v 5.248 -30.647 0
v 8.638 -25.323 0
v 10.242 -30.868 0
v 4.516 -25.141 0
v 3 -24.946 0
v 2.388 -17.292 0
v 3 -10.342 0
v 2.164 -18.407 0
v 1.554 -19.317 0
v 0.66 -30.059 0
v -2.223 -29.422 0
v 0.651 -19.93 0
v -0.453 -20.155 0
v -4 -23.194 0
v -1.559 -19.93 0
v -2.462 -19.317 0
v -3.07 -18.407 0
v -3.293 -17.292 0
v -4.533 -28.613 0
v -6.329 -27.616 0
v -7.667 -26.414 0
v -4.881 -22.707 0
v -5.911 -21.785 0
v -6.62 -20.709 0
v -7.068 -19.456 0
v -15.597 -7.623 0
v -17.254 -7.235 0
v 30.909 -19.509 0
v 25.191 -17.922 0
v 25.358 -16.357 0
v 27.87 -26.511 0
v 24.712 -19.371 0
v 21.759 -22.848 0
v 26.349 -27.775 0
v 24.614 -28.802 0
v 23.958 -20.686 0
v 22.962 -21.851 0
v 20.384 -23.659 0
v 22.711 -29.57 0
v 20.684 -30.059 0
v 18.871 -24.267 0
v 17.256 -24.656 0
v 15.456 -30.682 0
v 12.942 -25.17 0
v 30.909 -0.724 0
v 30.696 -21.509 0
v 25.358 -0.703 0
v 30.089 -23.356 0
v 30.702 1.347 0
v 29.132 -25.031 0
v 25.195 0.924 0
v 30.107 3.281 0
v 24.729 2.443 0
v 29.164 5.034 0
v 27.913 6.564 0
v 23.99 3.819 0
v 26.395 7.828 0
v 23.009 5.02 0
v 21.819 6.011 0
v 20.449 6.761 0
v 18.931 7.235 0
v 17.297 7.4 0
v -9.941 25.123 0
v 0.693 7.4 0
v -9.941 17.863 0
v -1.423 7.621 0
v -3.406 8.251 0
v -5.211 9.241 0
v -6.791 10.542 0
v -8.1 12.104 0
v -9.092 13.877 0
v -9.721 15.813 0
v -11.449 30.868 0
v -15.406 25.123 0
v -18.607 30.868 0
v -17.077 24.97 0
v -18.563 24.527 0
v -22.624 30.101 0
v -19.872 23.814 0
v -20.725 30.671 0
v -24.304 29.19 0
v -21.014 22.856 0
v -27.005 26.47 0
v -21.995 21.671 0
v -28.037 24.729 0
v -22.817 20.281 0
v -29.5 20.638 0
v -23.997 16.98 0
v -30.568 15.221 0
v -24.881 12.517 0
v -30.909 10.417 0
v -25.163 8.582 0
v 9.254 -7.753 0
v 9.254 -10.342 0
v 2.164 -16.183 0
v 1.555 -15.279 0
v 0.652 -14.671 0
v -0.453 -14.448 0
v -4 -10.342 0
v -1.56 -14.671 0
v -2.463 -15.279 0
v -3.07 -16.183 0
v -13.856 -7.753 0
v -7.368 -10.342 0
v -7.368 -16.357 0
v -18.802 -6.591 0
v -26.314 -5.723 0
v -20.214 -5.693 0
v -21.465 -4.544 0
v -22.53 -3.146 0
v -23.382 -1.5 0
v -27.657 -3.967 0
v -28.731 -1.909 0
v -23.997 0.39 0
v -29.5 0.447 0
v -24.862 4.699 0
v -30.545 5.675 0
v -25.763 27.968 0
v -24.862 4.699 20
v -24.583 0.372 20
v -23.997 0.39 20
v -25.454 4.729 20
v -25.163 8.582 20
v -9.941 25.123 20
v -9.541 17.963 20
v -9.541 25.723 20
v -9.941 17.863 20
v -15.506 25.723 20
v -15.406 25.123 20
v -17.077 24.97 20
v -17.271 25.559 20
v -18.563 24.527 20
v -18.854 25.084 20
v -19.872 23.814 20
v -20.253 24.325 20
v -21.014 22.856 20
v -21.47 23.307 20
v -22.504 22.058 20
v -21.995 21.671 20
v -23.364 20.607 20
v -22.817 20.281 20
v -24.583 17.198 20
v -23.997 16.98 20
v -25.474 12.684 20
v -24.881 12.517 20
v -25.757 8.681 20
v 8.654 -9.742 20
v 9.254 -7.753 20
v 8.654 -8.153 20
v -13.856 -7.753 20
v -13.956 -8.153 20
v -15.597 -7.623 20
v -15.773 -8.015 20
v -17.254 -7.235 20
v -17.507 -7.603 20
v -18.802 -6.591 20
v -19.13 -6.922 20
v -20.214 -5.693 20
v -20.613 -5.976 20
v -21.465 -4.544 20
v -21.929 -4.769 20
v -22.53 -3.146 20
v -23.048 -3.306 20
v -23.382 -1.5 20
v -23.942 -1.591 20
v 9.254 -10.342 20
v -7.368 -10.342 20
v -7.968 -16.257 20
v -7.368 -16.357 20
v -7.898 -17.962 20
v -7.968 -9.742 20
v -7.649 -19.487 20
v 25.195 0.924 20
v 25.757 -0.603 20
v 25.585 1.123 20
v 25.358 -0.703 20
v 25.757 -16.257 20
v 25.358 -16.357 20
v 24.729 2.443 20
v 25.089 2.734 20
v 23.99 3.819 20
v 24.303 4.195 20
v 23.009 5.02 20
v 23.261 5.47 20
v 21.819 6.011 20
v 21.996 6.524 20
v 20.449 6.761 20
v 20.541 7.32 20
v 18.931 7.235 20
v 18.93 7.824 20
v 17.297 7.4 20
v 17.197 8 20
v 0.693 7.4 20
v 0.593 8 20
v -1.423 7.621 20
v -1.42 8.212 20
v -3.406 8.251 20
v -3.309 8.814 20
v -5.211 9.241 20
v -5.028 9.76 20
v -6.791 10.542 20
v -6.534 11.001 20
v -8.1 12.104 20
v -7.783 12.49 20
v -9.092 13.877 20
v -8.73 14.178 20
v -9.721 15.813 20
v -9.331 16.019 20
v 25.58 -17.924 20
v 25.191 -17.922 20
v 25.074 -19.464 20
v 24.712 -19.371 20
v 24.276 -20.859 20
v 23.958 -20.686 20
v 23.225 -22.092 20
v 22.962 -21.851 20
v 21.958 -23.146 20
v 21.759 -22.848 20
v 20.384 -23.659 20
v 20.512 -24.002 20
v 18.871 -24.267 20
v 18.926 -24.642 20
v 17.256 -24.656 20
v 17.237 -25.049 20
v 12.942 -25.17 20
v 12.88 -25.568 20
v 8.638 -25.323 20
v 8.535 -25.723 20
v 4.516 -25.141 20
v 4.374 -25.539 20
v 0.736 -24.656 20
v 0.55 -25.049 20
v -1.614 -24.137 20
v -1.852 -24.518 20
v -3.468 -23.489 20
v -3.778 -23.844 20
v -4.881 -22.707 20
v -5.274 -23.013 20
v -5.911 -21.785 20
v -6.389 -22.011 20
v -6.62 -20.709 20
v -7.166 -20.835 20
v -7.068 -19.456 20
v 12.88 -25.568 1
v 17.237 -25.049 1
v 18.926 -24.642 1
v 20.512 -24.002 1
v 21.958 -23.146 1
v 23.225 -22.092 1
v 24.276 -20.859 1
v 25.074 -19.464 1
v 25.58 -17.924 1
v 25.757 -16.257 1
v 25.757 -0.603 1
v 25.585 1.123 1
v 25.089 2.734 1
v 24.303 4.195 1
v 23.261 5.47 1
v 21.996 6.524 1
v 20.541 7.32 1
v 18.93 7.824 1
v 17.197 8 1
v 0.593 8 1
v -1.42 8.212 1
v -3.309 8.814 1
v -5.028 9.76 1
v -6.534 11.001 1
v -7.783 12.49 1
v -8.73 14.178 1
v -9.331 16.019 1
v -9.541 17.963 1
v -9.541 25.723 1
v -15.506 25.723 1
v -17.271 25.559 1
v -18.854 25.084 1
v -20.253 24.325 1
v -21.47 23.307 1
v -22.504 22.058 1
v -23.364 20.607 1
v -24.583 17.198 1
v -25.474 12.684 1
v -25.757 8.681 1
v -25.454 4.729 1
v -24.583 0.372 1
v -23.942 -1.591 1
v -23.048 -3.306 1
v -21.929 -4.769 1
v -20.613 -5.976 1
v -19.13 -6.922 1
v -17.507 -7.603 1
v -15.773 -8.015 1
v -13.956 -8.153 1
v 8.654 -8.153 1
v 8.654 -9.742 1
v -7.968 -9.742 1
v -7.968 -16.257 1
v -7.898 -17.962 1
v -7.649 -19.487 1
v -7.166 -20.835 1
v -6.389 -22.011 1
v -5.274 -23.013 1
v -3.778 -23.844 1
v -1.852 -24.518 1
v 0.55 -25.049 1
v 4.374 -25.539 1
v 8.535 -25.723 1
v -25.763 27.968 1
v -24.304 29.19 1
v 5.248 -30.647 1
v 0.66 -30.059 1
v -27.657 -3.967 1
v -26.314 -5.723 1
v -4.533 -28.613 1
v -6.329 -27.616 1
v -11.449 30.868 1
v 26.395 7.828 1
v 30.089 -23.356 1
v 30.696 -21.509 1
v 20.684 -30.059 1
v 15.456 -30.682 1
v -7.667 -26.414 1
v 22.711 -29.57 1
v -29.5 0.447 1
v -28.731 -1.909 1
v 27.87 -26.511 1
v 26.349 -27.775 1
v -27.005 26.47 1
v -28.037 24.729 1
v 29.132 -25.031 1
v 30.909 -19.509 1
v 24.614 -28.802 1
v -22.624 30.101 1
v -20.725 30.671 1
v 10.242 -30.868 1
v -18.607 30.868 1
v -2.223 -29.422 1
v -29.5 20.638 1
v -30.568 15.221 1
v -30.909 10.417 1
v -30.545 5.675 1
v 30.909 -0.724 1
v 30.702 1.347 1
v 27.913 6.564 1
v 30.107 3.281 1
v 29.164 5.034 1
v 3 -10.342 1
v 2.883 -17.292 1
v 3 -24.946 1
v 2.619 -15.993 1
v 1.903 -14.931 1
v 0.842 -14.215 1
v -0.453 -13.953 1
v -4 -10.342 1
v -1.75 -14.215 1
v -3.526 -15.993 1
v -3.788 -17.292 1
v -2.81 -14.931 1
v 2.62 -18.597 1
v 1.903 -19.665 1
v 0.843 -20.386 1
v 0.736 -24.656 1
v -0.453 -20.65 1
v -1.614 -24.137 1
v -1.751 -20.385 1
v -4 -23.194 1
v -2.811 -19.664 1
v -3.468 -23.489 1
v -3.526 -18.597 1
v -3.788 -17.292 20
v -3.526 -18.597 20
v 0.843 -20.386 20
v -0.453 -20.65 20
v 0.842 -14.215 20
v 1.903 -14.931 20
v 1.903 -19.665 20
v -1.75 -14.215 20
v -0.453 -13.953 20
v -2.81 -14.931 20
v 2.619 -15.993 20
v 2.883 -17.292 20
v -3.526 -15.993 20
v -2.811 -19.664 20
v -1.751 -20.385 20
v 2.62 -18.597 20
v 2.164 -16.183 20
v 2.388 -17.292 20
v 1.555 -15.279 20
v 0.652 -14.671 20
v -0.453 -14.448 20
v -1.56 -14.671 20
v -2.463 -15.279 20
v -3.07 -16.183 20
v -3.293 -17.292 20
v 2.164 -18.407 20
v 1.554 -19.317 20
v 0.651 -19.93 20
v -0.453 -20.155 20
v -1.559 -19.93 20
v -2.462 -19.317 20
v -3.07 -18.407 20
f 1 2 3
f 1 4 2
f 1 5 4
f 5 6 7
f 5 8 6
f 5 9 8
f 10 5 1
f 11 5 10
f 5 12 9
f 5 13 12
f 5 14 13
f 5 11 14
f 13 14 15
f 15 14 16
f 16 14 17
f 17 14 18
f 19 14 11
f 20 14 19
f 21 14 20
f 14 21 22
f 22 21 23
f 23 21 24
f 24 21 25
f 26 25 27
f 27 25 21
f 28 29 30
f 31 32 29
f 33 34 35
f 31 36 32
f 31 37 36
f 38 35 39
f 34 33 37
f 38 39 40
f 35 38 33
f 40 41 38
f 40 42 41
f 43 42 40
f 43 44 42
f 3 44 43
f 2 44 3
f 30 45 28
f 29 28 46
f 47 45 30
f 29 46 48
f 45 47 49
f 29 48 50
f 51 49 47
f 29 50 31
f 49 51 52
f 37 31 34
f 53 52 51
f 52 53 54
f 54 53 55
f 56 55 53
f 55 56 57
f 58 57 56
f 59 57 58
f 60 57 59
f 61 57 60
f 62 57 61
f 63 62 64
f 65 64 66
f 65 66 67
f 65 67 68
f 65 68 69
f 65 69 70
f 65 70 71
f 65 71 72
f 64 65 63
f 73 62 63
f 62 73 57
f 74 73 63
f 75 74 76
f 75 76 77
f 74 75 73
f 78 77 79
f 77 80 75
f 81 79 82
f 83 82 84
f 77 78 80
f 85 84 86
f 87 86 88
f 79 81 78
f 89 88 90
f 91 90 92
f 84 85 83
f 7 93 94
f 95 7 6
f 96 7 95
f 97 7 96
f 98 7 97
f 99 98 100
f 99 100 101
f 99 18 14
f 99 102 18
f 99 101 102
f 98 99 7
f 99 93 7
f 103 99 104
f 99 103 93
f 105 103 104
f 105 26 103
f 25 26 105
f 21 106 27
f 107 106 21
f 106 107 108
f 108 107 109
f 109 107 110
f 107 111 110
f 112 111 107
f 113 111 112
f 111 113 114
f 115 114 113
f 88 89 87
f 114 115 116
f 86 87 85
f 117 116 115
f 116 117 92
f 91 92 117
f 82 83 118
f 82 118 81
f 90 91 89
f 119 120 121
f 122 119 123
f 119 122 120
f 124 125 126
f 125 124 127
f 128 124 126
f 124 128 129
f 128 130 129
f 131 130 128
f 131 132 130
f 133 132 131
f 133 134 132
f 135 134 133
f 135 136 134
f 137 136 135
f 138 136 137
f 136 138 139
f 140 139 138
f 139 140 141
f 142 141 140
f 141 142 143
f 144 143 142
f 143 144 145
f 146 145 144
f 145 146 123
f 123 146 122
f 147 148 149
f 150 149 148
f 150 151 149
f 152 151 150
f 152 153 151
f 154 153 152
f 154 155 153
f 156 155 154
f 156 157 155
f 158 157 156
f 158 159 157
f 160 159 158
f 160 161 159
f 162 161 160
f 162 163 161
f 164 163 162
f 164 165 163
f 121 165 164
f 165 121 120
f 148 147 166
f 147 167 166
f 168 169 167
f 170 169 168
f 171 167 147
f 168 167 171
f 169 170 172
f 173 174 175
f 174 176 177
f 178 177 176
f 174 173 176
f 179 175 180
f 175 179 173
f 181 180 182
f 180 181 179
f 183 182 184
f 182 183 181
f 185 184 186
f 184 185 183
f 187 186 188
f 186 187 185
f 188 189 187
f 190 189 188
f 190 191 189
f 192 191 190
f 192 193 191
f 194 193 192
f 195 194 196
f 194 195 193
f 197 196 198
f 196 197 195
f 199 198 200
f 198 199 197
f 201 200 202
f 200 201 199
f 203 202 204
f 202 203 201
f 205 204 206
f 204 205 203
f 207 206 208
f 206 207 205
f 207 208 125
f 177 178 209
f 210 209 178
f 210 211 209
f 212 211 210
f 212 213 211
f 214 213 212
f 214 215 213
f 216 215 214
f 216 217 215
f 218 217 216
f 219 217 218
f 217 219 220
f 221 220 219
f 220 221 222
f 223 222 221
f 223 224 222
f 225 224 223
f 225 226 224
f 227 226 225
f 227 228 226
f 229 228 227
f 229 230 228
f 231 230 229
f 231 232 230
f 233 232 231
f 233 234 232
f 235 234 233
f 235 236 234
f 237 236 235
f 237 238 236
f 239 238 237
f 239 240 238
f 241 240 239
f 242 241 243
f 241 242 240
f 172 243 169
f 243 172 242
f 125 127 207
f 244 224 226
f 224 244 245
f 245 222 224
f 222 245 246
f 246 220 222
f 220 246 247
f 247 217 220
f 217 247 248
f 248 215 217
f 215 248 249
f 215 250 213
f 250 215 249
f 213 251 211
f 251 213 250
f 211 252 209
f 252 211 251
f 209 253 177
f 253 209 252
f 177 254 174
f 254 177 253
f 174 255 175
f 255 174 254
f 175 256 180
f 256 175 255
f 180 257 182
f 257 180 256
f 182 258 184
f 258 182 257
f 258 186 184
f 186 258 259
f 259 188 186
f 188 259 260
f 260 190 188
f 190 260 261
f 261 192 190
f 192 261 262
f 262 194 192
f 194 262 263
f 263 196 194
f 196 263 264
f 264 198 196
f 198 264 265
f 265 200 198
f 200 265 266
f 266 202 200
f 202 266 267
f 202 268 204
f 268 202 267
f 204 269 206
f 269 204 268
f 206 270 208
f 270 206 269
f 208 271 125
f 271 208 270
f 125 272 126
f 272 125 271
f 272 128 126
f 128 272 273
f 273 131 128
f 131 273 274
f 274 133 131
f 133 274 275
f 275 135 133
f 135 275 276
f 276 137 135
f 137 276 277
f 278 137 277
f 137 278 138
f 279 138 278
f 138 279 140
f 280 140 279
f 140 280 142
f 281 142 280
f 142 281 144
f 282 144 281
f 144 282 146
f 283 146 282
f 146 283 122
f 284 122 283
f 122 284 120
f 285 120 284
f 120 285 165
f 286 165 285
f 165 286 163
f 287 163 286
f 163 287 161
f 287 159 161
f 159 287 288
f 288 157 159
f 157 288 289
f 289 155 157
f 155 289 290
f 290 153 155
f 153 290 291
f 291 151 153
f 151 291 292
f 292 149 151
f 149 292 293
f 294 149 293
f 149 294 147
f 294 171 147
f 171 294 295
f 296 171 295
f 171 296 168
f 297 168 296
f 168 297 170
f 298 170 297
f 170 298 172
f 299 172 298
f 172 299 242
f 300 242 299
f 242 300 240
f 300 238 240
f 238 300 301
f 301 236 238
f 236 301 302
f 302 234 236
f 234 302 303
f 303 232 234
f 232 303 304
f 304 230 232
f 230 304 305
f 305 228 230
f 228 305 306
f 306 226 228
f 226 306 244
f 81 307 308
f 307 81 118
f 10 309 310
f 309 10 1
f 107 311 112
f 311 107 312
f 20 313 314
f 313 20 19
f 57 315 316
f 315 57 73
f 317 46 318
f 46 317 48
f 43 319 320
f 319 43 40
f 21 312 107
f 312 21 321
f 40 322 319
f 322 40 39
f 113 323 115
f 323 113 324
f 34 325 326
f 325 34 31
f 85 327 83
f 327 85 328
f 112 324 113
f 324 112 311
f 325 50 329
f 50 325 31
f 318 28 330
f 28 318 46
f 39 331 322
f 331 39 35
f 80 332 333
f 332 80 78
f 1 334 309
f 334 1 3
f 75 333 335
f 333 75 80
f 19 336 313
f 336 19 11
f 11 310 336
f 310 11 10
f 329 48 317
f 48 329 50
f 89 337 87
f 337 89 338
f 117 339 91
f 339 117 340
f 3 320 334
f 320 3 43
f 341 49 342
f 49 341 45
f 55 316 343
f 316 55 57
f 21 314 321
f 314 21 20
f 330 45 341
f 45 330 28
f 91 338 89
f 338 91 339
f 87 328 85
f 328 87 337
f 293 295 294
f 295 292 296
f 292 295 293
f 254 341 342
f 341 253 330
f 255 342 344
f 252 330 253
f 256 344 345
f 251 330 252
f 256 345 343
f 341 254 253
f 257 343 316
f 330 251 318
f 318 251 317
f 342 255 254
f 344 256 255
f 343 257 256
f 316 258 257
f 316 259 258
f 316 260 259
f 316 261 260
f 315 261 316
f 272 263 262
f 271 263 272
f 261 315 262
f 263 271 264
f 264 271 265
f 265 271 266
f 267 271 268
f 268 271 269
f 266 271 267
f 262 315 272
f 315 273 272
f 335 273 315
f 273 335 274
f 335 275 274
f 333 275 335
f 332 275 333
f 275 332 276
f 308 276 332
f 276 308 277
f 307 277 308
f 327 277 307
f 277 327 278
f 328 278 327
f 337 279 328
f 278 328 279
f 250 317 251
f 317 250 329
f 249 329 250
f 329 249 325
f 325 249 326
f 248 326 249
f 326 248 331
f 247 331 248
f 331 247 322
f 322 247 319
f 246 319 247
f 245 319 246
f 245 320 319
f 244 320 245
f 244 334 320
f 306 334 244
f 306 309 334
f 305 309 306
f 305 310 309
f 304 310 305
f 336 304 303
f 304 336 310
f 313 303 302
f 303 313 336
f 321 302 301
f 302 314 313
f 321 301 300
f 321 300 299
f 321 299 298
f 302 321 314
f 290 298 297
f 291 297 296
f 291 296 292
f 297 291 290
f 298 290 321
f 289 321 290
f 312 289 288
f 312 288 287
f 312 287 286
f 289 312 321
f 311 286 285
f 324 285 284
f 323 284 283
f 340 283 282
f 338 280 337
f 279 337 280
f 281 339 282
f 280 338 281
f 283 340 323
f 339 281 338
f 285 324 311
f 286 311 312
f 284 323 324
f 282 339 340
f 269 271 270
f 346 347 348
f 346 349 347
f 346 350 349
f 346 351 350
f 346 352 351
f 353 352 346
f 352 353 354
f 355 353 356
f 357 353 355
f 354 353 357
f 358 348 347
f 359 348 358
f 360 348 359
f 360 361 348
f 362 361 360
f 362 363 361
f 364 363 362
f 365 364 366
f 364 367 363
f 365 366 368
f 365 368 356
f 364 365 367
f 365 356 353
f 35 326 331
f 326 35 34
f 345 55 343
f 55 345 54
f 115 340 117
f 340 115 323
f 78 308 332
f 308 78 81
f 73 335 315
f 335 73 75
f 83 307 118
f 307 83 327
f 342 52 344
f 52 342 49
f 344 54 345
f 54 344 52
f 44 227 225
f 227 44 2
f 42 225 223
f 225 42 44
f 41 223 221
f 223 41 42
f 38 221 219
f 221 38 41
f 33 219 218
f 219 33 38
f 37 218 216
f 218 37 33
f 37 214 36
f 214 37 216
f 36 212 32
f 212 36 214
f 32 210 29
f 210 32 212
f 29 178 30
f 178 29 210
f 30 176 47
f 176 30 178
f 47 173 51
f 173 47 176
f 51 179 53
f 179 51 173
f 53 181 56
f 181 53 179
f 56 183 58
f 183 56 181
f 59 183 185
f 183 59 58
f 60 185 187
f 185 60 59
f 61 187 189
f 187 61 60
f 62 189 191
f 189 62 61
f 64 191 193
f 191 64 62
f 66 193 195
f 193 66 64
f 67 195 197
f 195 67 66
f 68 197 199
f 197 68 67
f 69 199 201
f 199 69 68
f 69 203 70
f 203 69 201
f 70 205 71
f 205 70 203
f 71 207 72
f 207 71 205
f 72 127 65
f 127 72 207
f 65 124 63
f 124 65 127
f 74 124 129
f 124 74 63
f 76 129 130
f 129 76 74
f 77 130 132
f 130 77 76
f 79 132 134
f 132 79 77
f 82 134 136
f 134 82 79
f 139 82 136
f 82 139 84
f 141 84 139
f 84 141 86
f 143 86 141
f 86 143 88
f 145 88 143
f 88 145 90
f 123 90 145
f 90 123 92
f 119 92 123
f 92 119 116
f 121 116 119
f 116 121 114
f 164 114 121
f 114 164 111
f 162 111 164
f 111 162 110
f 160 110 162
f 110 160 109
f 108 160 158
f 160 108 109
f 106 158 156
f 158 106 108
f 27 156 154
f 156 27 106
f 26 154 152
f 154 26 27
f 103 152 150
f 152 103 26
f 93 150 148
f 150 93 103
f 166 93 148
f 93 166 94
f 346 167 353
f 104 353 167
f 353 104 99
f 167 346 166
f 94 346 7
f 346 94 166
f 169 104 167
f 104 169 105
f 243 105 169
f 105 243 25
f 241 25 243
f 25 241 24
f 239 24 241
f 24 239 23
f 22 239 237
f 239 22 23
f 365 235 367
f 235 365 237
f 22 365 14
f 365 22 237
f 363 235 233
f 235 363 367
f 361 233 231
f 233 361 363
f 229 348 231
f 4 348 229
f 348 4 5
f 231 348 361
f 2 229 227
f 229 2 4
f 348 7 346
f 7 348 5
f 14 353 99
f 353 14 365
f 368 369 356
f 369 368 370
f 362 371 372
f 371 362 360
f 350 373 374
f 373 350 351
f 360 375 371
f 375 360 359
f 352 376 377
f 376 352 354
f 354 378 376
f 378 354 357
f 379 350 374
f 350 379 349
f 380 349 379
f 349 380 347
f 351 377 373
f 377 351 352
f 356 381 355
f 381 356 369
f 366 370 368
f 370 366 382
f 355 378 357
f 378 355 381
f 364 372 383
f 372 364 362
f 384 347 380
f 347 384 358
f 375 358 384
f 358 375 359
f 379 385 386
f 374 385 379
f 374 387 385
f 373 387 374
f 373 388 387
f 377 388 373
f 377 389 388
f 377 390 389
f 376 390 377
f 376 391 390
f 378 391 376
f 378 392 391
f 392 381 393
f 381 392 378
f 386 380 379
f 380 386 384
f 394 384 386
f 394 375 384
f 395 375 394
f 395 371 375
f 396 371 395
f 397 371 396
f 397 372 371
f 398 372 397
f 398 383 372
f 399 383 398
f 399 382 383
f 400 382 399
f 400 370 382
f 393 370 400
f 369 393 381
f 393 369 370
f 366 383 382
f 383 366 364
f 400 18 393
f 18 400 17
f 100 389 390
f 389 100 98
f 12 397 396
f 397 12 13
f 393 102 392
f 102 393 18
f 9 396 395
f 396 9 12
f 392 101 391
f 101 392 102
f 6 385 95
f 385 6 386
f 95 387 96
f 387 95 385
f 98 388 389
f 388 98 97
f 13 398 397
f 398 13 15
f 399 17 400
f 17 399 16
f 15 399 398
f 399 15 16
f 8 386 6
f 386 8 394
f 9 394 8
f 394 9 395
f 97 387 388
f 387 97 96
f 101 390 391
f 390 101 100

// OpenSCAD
// file: p-half.scad
// Module names are of the form poly_<inkscape-path-id>().  As a result,
// you can associate a polygon in this OpenSCAD program with the corresponding
// SVG element in the Inkscape document by looking for the XML element with
// the attribute id="inkscape-path-id".

// fudge value is used to ensure that subtracted solids are a tad taller
// in the z dimension than the polygon being subtracted from.  This helps
// keep the resulting .stl file manifold.
fudge = 0.1;

module poly_half_outer(h)
{
  scale([25.4/90, -25.4/90, 1]) union()
  {
    linear_extrude(height=h)
      polygon([[30.243227,-91.145510],[15.496832,-90.492611],[1.950257,-88.756838],[-6.563700,-86.874606],[-13.385609,-84.485967],[-18.687045,-81.541846],[-22.639583,-77.993166],[-25.389702,-73.825158],[-27.104098,-69.046741],[-27.984675,-63.644368],[-28.233333,-57.604494],[-28.233333,-34.518557],[30.665107,-34.518557],[30.665107,-28.889651],[-27.346613,-28.889651],[-49.450133,-28.889651],[-55.887778,-28.399932],[-62.032228,-26.940893],[-67.782850,-24.527707],[-73.039011,-21.175548],[-77.700077,-16.899591],[-81.665417,-11.715009],[-84.834396,-5.636978],[-87.106383,1.319330],[-90.192546,16.757280],[-91.266667,30.758299],[-90.260645,44.944618],[-87.106383,60.938470],[-82.786996,73.017894],[-79.740282,78.159507],[-76.073173,82.583010],[-71.763379,86.190519],[-66.804333,88.881696],[-61.196994,90.564155],[-54.942323,91.145510],[-33.805603,91.145510],[-33.805603,63.647460],[-33.061354,56.758914],[-30.933282,50.238581],[-27.578403,44.256061],[-23.153731,38.980955],[-17.816279,34.582863],[-11.723062,31.231387],[-5.031096,29.096125],[2.102607,28.346680],[60.932677,28.346680],[67.075888,27.723394],[72.783903,25.937517],[77.938396,23.115022],[82.421043,19.381881],[86.113519,14.864066],[88.897498,9.687550],[90.654656,3.978303],[91.266667,-2.137700],[91.266667,-57.604494],[90.638988,-63.509642],[88.845058,-68.965869],[86.018539,-73.910334],[82.293092,-78.280197],[77.802379,-82.012619],[72.680061,-85.044760],[67.059800,-87.313779],[61.075257,-88.756838],[45.638118,-90.596608],[30.243227,-91.145510]]);
  }
}

module poly_half_inner(h)
{
  scale([25.4/90, -25.4/90, 1]) union()
  {
    linear_extrude(height=h)
      polygon([[30.251227,-89.374026],[45.504111,-88.829951],[60.788337,-87.008791],[66.512660,-85.631900],[71.872564,-83.475744],[76.745122,-80.601579],[81.007411,-77.070657],[84.536504,-72.944233],[87.209478,-68.283562],[88.903407,-63.149898],[89.495367,-57.604494],[89.495367,-2.137700],[88.920027,3.629629],[87.267744,9.010264],[84.649138,13.886378],[81.174824,18.140145],[76.955423,21.653737],[72.101551,24.309326],[66.723826,25.989086],[60.932867,26.575190],[2.102797,26.575190],[-5.394946,27.358373],[-12.422735,29.591384],[-18.817293,33.099432],[-24.415342,37.707723],[-29.053604,43.241464],[-32.568802,49.525862],[-34.797657,56.386125],[-35.576893,63.647460],[-35.576893,89.374020],[-54.942133,89.374020],[-60.863459,88.832207],[-66.128176,87.259588],[-70.767643,84.735395],[-74.813223,81.338860],[-78.288708,77.141679],[-81.202952,72.217640],[-85.383533,60.518550],[-88.515308,44.705269],[-89.514623,30.763493],[-88.448393,17.003933],[-85.383533,1.737300],[-85.383533,1.735300],[-83.205556,-4.961343],[-80.184686,-10.791280],[-76.411838,-15.746443],[-71.977927,-19.818763],[-66.973867,-23.000170],[-61.490574,-25.282594],[-55.618961,-26.657965],[-49.449943,-27.118216],[-27.346423,-27.118216],[32.436777,-27.118216],[32.436777,-36.290091],[-26.461663,-36.290091],[-26.461663,-57.604544],[-25.397084,-68.583187],[-23.811620,-73.023172],[-21.297593,-76.836966],[-17.649549,-80.102209],[-12.641659,-82.873059],[-6.073555,-85.169320],[2.255137,-87.010794],[15.646979,-88.726738],[30.251227,-89.374076]]);
  }
}

module poly_half_eye_inner(h)
{
  scale([25.4/90, -25.4/90, 1]) union()
  {
    linear_extrude(height=h)
      polygon([[-1.604233,-71.416419],[2.306792,-70.619484],[5.506582,-68.445794],[7.667052,-65.221025],[8.460117,-61.270852],[7.667677,-57.341052],[5.508247,-54.138457],[2.308665,-51.982587],[-1.604233,-51.192960],[-5.527068,-51.982297],[-8.725618,-54.137678],[-10.879613,-57.340174],[-11.668783,-61.270852],[-10.878998,-65.221901],[-8.723992,-68.446573],[-5.525292,-70.619776],[-1.604423,-71.416419]]);
  }
}

module poly_half_eye_outer(h)
{
  scale([25.4/90, -25.4/90, 1]) union()
  {
    linear_extrude(height=h)
      polygon([[-1.604233,-73.170187],[-6.202593,-72.231980],[-9.959322,-69.676690],[-12.493039,-65.893314],[-13.422363,-61.270852],[-12.492419,-56.667348],[-9.957668,-52.906305],[-6.200732,-50.369621],[-1.604233,-49.439192],[2.983861,-50.369326],[6.741727,-52.905522],[9.281143,-56.666467],[10.213887,-61.270852],[9.281768,-65.894190],[6.743392,-69.677468],[2.985734,-72.232272],[-1.604233,-73.170187]]);
  }
}
// main file
include <p-half.scad>;    // poly_path4442

scale([1, -1, 1]) union() {
    difference() {
        union() {
            poly_half_outer(20);
            scale([1.2, 1.2, 1]) hull() {
                poly_half_outer(1);
            }
        }
        translate([0.1,0.1,-10]) {
            poly_half_inner(40);
        }
    }
    difference() {
        union() {
            translate([-4,8,0]) {
                cube([7, 18, 1]);
            }
            poly_half_eye_outer(20);
        }
        translate([0,0,-1]) {
            poly_half_eye_inner(22);
        }
    }
}
